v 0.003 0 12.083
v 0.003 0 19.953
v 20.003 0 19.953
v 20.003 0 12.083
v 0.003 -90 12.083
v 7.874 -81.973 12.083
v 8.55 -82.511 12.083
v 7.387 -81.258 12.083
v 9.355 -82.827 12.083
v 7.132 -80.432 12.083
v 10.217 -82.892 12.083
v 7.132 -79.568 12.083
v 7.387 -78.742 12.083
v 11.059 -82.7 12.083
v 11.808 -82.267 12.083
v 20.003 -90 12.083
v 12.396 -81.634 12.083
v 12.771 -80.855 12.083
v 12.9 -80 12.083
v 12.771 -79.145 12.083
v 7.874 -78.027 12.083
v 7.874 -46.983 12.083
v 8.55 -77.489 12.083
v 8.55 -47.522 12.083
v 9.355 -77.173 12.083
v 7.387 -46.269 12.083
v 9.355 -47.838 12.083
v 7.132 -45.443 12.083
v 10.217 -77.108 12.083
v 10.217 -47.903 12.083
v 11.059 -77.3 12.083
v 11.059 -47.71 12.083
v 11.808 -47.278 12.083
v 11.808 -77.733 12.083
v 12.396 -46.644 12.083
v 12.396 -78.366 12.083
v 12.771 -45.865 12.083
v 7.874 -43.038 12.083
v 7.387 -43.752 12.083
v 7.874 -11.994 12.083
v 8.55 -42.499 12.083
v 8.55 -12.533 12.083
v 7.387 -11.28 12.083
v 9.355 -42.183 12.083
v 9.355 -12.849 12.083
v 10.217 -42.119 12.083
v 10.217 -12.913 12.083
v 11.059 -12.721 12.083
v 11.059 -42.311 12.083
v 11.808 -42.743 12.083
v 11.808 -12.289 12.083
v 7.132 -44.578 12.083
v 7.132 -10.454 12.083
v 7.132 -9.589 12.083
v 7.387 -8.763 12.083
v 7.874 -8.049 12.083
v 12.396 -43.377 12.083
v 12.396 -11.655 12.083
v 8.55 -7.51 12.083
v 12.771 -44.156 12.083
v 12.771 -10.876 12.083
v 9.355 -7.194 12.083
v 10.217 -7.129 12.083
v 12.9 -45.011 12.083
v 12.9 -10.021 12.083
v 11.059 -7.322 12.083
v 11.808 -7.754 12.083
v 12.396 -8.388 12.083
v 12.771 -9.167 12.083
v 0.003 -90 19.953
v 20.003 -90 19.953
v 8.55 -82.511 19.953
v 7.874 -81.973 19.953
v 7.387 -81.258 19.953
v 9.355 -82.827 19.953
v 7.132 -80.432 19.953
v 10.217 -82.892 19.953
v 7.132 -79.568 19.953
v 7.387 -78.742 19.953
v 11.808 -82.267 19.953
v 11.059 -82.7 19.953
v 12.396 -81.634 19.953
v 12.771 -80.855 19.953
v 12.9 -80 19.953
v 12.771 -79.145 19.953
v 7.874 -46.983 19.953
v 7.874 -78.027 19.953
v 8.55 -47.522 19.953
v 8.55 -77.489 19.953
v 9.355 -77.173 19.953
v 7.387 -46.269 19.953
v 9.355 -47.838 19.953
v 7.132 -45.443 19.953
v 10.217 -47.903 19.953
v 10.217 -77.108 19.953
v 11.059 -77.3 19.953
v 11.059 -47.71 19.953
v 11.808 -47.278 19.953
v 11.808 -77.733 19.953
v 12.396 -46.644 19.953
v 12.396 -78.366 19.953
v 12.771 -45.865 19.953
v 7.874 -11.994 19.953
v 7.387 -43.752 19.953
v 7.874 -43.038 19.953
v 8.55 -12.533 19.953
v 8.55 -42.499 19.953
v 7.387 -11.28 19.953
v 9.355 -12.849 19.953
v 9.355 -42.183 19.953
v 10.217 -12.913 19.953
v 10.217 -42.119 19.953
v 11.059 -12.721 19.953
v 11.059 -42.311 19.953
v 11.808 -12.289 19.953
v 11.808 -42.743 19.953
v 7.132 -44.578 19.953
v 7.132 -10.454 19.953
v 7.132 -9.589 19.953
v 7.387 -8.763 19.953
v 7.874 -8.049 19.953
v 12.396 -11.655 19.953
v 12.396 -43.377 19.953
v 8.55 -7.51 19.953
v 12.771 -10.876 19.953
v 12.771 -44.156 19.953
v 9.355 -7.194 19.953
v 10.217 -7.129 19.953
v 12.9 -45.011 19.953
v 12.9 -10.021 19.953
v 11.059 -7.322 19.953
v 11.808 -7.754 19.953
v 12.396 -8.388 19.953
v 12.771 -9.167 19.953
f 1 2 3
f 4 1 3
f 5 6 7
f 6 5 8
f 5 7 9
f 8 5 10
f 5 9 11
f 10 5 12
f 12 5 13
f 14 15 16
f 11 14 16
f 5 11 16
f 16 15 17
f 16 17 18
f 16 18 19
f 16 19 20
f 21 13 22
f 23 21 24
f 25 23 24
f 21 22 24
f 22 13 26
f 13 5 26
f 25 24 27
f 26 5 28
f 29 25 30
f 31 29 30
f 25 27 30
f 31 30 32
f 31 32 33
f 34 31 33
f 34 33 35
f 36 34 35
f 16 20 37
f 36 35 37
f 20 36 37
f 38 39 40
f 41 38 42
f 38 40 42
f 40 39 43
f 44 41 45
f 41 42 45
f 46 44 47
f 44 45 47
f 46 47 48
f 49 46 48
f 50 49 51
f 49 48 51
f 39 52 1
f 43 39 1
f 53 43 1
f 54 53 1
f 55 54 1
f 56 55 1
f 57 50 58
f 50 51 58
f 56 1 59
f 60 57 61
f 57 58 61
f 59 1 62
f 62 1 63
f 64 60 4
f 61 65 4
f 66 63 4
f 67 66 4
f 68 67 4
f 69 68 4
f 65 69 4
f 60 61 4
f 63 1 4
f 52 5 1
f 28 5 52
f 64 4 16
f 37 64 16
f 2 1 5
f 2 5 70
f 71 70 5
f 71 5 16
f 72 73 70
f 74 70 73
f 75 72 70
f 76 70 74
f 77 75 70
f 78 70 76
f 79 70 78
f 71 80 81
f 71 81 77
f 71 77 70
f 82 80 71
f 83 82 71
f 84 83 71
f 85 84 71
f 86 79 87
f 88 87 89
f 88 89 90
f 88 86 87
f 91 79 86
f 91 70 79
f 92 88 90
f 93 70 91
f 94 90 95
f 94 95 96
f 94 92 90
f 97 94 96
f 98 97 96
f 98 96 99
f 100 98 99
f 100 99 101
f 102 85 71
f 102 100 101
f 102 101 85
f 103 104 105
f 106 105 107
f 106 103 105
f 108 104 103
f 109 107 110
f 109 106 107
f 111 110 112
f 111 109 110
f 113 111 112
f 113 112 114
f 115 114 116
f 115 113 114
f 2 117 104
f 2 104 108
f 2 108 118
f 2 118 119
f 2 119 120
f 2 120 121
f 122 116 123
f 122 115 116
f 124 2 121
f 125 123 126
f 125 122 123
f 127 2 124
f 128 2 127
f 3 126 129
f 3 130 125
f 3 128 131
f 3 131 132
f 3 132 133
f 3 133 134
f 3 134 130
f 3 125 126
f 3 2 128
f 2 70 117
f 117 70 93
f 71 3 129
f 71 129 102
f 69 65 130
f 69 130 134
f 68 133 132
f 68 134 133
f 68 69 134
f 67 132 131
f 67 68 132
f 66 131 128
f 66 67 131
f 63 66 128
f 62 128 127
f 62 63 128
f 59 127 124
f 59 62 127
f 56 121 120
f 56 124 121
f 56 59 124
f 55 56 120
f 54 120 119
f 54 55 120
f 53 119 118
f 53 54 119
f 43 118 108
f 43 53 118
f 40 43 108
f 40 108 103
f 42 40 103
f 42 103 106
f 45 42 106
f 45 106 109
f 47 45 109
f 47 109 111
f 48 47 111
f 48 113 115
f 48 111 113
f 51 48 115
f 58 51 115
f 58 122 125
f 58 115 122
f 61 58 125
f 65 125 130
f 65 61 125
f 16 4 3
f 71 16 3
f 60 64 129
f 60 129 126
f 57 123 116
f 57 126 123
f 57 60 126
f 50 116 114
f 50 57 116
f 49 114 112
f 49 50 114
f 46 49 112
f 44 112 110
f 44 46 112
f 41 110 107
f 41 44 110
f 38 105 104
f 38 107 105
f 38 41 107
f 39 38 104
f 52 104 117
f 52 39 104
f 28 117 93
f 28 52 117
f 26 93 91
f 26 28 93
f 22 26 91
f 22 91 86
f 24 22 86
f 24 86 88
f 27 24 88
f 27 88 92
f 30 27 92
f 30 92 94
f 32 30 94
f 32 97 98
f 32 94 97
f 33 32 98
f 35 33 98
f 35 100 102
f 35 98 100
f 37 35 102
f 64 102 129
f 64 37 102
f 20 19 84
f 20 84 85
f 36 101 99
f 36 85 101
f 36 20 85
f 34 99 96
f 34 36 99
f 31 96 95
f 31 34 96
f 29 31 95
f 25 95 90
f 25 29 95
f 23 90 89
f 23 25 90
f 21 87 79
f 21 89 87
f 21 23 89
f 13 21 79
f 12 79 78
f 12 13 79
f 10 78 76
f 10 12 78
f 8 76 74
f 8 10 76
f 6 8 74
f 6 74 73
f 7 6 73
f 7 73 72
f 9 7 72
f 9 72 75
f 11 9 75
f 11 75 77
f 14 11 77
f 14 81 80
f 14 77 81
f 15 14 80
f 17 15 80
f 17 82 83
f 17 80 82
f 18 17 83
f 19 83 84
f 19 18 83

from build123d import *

# Parameters (mm, degrees)
SKETCH010_R      = 2.9
EXTRUDE010_DEPTH = 20
SKETCH009_W      = 20
SKETCH009_H      = 7.87
EXTRUDE009_DEPTH = 90


with BuildPart() as tornillos003:
    # Sketch010 (on Face4 of Extrude009) → Extrude010 (new body)
    with BuildSketch(Plane.XY.offset(19.952513)):
        with Locations((10, -80)):
            Circle(SKETCH010_R)
        with Locations((10, -45.010692)):
            Circle(SKETCH010_R)
        with Locations((10, -10.021384)):
            Circle(SKETCH010_R)
    extrude(amount=EXTRUDE010_DEPTH)


with BuildPart() as tornillos003_1:
    # Extrude010 placement: moved
    add(tornillos003.part.moved(Location((0, 0, -15))))


with BuildPart() as cut:
    # Sketch009 → Extrude009 (new body)
    with BuildSketch(Plane.XZ):
        with Locations((10.003101, 16.017513)):
            Rectangle(SKETCH009_W, SKETCH009_H)
    extrude(amount=EXTRUDE009_DEPTH)

    # Cut: cut Tornillos003
    add(tornillos003_1.part, mode=Mode.SUBTRACT)


solid = cut.part
